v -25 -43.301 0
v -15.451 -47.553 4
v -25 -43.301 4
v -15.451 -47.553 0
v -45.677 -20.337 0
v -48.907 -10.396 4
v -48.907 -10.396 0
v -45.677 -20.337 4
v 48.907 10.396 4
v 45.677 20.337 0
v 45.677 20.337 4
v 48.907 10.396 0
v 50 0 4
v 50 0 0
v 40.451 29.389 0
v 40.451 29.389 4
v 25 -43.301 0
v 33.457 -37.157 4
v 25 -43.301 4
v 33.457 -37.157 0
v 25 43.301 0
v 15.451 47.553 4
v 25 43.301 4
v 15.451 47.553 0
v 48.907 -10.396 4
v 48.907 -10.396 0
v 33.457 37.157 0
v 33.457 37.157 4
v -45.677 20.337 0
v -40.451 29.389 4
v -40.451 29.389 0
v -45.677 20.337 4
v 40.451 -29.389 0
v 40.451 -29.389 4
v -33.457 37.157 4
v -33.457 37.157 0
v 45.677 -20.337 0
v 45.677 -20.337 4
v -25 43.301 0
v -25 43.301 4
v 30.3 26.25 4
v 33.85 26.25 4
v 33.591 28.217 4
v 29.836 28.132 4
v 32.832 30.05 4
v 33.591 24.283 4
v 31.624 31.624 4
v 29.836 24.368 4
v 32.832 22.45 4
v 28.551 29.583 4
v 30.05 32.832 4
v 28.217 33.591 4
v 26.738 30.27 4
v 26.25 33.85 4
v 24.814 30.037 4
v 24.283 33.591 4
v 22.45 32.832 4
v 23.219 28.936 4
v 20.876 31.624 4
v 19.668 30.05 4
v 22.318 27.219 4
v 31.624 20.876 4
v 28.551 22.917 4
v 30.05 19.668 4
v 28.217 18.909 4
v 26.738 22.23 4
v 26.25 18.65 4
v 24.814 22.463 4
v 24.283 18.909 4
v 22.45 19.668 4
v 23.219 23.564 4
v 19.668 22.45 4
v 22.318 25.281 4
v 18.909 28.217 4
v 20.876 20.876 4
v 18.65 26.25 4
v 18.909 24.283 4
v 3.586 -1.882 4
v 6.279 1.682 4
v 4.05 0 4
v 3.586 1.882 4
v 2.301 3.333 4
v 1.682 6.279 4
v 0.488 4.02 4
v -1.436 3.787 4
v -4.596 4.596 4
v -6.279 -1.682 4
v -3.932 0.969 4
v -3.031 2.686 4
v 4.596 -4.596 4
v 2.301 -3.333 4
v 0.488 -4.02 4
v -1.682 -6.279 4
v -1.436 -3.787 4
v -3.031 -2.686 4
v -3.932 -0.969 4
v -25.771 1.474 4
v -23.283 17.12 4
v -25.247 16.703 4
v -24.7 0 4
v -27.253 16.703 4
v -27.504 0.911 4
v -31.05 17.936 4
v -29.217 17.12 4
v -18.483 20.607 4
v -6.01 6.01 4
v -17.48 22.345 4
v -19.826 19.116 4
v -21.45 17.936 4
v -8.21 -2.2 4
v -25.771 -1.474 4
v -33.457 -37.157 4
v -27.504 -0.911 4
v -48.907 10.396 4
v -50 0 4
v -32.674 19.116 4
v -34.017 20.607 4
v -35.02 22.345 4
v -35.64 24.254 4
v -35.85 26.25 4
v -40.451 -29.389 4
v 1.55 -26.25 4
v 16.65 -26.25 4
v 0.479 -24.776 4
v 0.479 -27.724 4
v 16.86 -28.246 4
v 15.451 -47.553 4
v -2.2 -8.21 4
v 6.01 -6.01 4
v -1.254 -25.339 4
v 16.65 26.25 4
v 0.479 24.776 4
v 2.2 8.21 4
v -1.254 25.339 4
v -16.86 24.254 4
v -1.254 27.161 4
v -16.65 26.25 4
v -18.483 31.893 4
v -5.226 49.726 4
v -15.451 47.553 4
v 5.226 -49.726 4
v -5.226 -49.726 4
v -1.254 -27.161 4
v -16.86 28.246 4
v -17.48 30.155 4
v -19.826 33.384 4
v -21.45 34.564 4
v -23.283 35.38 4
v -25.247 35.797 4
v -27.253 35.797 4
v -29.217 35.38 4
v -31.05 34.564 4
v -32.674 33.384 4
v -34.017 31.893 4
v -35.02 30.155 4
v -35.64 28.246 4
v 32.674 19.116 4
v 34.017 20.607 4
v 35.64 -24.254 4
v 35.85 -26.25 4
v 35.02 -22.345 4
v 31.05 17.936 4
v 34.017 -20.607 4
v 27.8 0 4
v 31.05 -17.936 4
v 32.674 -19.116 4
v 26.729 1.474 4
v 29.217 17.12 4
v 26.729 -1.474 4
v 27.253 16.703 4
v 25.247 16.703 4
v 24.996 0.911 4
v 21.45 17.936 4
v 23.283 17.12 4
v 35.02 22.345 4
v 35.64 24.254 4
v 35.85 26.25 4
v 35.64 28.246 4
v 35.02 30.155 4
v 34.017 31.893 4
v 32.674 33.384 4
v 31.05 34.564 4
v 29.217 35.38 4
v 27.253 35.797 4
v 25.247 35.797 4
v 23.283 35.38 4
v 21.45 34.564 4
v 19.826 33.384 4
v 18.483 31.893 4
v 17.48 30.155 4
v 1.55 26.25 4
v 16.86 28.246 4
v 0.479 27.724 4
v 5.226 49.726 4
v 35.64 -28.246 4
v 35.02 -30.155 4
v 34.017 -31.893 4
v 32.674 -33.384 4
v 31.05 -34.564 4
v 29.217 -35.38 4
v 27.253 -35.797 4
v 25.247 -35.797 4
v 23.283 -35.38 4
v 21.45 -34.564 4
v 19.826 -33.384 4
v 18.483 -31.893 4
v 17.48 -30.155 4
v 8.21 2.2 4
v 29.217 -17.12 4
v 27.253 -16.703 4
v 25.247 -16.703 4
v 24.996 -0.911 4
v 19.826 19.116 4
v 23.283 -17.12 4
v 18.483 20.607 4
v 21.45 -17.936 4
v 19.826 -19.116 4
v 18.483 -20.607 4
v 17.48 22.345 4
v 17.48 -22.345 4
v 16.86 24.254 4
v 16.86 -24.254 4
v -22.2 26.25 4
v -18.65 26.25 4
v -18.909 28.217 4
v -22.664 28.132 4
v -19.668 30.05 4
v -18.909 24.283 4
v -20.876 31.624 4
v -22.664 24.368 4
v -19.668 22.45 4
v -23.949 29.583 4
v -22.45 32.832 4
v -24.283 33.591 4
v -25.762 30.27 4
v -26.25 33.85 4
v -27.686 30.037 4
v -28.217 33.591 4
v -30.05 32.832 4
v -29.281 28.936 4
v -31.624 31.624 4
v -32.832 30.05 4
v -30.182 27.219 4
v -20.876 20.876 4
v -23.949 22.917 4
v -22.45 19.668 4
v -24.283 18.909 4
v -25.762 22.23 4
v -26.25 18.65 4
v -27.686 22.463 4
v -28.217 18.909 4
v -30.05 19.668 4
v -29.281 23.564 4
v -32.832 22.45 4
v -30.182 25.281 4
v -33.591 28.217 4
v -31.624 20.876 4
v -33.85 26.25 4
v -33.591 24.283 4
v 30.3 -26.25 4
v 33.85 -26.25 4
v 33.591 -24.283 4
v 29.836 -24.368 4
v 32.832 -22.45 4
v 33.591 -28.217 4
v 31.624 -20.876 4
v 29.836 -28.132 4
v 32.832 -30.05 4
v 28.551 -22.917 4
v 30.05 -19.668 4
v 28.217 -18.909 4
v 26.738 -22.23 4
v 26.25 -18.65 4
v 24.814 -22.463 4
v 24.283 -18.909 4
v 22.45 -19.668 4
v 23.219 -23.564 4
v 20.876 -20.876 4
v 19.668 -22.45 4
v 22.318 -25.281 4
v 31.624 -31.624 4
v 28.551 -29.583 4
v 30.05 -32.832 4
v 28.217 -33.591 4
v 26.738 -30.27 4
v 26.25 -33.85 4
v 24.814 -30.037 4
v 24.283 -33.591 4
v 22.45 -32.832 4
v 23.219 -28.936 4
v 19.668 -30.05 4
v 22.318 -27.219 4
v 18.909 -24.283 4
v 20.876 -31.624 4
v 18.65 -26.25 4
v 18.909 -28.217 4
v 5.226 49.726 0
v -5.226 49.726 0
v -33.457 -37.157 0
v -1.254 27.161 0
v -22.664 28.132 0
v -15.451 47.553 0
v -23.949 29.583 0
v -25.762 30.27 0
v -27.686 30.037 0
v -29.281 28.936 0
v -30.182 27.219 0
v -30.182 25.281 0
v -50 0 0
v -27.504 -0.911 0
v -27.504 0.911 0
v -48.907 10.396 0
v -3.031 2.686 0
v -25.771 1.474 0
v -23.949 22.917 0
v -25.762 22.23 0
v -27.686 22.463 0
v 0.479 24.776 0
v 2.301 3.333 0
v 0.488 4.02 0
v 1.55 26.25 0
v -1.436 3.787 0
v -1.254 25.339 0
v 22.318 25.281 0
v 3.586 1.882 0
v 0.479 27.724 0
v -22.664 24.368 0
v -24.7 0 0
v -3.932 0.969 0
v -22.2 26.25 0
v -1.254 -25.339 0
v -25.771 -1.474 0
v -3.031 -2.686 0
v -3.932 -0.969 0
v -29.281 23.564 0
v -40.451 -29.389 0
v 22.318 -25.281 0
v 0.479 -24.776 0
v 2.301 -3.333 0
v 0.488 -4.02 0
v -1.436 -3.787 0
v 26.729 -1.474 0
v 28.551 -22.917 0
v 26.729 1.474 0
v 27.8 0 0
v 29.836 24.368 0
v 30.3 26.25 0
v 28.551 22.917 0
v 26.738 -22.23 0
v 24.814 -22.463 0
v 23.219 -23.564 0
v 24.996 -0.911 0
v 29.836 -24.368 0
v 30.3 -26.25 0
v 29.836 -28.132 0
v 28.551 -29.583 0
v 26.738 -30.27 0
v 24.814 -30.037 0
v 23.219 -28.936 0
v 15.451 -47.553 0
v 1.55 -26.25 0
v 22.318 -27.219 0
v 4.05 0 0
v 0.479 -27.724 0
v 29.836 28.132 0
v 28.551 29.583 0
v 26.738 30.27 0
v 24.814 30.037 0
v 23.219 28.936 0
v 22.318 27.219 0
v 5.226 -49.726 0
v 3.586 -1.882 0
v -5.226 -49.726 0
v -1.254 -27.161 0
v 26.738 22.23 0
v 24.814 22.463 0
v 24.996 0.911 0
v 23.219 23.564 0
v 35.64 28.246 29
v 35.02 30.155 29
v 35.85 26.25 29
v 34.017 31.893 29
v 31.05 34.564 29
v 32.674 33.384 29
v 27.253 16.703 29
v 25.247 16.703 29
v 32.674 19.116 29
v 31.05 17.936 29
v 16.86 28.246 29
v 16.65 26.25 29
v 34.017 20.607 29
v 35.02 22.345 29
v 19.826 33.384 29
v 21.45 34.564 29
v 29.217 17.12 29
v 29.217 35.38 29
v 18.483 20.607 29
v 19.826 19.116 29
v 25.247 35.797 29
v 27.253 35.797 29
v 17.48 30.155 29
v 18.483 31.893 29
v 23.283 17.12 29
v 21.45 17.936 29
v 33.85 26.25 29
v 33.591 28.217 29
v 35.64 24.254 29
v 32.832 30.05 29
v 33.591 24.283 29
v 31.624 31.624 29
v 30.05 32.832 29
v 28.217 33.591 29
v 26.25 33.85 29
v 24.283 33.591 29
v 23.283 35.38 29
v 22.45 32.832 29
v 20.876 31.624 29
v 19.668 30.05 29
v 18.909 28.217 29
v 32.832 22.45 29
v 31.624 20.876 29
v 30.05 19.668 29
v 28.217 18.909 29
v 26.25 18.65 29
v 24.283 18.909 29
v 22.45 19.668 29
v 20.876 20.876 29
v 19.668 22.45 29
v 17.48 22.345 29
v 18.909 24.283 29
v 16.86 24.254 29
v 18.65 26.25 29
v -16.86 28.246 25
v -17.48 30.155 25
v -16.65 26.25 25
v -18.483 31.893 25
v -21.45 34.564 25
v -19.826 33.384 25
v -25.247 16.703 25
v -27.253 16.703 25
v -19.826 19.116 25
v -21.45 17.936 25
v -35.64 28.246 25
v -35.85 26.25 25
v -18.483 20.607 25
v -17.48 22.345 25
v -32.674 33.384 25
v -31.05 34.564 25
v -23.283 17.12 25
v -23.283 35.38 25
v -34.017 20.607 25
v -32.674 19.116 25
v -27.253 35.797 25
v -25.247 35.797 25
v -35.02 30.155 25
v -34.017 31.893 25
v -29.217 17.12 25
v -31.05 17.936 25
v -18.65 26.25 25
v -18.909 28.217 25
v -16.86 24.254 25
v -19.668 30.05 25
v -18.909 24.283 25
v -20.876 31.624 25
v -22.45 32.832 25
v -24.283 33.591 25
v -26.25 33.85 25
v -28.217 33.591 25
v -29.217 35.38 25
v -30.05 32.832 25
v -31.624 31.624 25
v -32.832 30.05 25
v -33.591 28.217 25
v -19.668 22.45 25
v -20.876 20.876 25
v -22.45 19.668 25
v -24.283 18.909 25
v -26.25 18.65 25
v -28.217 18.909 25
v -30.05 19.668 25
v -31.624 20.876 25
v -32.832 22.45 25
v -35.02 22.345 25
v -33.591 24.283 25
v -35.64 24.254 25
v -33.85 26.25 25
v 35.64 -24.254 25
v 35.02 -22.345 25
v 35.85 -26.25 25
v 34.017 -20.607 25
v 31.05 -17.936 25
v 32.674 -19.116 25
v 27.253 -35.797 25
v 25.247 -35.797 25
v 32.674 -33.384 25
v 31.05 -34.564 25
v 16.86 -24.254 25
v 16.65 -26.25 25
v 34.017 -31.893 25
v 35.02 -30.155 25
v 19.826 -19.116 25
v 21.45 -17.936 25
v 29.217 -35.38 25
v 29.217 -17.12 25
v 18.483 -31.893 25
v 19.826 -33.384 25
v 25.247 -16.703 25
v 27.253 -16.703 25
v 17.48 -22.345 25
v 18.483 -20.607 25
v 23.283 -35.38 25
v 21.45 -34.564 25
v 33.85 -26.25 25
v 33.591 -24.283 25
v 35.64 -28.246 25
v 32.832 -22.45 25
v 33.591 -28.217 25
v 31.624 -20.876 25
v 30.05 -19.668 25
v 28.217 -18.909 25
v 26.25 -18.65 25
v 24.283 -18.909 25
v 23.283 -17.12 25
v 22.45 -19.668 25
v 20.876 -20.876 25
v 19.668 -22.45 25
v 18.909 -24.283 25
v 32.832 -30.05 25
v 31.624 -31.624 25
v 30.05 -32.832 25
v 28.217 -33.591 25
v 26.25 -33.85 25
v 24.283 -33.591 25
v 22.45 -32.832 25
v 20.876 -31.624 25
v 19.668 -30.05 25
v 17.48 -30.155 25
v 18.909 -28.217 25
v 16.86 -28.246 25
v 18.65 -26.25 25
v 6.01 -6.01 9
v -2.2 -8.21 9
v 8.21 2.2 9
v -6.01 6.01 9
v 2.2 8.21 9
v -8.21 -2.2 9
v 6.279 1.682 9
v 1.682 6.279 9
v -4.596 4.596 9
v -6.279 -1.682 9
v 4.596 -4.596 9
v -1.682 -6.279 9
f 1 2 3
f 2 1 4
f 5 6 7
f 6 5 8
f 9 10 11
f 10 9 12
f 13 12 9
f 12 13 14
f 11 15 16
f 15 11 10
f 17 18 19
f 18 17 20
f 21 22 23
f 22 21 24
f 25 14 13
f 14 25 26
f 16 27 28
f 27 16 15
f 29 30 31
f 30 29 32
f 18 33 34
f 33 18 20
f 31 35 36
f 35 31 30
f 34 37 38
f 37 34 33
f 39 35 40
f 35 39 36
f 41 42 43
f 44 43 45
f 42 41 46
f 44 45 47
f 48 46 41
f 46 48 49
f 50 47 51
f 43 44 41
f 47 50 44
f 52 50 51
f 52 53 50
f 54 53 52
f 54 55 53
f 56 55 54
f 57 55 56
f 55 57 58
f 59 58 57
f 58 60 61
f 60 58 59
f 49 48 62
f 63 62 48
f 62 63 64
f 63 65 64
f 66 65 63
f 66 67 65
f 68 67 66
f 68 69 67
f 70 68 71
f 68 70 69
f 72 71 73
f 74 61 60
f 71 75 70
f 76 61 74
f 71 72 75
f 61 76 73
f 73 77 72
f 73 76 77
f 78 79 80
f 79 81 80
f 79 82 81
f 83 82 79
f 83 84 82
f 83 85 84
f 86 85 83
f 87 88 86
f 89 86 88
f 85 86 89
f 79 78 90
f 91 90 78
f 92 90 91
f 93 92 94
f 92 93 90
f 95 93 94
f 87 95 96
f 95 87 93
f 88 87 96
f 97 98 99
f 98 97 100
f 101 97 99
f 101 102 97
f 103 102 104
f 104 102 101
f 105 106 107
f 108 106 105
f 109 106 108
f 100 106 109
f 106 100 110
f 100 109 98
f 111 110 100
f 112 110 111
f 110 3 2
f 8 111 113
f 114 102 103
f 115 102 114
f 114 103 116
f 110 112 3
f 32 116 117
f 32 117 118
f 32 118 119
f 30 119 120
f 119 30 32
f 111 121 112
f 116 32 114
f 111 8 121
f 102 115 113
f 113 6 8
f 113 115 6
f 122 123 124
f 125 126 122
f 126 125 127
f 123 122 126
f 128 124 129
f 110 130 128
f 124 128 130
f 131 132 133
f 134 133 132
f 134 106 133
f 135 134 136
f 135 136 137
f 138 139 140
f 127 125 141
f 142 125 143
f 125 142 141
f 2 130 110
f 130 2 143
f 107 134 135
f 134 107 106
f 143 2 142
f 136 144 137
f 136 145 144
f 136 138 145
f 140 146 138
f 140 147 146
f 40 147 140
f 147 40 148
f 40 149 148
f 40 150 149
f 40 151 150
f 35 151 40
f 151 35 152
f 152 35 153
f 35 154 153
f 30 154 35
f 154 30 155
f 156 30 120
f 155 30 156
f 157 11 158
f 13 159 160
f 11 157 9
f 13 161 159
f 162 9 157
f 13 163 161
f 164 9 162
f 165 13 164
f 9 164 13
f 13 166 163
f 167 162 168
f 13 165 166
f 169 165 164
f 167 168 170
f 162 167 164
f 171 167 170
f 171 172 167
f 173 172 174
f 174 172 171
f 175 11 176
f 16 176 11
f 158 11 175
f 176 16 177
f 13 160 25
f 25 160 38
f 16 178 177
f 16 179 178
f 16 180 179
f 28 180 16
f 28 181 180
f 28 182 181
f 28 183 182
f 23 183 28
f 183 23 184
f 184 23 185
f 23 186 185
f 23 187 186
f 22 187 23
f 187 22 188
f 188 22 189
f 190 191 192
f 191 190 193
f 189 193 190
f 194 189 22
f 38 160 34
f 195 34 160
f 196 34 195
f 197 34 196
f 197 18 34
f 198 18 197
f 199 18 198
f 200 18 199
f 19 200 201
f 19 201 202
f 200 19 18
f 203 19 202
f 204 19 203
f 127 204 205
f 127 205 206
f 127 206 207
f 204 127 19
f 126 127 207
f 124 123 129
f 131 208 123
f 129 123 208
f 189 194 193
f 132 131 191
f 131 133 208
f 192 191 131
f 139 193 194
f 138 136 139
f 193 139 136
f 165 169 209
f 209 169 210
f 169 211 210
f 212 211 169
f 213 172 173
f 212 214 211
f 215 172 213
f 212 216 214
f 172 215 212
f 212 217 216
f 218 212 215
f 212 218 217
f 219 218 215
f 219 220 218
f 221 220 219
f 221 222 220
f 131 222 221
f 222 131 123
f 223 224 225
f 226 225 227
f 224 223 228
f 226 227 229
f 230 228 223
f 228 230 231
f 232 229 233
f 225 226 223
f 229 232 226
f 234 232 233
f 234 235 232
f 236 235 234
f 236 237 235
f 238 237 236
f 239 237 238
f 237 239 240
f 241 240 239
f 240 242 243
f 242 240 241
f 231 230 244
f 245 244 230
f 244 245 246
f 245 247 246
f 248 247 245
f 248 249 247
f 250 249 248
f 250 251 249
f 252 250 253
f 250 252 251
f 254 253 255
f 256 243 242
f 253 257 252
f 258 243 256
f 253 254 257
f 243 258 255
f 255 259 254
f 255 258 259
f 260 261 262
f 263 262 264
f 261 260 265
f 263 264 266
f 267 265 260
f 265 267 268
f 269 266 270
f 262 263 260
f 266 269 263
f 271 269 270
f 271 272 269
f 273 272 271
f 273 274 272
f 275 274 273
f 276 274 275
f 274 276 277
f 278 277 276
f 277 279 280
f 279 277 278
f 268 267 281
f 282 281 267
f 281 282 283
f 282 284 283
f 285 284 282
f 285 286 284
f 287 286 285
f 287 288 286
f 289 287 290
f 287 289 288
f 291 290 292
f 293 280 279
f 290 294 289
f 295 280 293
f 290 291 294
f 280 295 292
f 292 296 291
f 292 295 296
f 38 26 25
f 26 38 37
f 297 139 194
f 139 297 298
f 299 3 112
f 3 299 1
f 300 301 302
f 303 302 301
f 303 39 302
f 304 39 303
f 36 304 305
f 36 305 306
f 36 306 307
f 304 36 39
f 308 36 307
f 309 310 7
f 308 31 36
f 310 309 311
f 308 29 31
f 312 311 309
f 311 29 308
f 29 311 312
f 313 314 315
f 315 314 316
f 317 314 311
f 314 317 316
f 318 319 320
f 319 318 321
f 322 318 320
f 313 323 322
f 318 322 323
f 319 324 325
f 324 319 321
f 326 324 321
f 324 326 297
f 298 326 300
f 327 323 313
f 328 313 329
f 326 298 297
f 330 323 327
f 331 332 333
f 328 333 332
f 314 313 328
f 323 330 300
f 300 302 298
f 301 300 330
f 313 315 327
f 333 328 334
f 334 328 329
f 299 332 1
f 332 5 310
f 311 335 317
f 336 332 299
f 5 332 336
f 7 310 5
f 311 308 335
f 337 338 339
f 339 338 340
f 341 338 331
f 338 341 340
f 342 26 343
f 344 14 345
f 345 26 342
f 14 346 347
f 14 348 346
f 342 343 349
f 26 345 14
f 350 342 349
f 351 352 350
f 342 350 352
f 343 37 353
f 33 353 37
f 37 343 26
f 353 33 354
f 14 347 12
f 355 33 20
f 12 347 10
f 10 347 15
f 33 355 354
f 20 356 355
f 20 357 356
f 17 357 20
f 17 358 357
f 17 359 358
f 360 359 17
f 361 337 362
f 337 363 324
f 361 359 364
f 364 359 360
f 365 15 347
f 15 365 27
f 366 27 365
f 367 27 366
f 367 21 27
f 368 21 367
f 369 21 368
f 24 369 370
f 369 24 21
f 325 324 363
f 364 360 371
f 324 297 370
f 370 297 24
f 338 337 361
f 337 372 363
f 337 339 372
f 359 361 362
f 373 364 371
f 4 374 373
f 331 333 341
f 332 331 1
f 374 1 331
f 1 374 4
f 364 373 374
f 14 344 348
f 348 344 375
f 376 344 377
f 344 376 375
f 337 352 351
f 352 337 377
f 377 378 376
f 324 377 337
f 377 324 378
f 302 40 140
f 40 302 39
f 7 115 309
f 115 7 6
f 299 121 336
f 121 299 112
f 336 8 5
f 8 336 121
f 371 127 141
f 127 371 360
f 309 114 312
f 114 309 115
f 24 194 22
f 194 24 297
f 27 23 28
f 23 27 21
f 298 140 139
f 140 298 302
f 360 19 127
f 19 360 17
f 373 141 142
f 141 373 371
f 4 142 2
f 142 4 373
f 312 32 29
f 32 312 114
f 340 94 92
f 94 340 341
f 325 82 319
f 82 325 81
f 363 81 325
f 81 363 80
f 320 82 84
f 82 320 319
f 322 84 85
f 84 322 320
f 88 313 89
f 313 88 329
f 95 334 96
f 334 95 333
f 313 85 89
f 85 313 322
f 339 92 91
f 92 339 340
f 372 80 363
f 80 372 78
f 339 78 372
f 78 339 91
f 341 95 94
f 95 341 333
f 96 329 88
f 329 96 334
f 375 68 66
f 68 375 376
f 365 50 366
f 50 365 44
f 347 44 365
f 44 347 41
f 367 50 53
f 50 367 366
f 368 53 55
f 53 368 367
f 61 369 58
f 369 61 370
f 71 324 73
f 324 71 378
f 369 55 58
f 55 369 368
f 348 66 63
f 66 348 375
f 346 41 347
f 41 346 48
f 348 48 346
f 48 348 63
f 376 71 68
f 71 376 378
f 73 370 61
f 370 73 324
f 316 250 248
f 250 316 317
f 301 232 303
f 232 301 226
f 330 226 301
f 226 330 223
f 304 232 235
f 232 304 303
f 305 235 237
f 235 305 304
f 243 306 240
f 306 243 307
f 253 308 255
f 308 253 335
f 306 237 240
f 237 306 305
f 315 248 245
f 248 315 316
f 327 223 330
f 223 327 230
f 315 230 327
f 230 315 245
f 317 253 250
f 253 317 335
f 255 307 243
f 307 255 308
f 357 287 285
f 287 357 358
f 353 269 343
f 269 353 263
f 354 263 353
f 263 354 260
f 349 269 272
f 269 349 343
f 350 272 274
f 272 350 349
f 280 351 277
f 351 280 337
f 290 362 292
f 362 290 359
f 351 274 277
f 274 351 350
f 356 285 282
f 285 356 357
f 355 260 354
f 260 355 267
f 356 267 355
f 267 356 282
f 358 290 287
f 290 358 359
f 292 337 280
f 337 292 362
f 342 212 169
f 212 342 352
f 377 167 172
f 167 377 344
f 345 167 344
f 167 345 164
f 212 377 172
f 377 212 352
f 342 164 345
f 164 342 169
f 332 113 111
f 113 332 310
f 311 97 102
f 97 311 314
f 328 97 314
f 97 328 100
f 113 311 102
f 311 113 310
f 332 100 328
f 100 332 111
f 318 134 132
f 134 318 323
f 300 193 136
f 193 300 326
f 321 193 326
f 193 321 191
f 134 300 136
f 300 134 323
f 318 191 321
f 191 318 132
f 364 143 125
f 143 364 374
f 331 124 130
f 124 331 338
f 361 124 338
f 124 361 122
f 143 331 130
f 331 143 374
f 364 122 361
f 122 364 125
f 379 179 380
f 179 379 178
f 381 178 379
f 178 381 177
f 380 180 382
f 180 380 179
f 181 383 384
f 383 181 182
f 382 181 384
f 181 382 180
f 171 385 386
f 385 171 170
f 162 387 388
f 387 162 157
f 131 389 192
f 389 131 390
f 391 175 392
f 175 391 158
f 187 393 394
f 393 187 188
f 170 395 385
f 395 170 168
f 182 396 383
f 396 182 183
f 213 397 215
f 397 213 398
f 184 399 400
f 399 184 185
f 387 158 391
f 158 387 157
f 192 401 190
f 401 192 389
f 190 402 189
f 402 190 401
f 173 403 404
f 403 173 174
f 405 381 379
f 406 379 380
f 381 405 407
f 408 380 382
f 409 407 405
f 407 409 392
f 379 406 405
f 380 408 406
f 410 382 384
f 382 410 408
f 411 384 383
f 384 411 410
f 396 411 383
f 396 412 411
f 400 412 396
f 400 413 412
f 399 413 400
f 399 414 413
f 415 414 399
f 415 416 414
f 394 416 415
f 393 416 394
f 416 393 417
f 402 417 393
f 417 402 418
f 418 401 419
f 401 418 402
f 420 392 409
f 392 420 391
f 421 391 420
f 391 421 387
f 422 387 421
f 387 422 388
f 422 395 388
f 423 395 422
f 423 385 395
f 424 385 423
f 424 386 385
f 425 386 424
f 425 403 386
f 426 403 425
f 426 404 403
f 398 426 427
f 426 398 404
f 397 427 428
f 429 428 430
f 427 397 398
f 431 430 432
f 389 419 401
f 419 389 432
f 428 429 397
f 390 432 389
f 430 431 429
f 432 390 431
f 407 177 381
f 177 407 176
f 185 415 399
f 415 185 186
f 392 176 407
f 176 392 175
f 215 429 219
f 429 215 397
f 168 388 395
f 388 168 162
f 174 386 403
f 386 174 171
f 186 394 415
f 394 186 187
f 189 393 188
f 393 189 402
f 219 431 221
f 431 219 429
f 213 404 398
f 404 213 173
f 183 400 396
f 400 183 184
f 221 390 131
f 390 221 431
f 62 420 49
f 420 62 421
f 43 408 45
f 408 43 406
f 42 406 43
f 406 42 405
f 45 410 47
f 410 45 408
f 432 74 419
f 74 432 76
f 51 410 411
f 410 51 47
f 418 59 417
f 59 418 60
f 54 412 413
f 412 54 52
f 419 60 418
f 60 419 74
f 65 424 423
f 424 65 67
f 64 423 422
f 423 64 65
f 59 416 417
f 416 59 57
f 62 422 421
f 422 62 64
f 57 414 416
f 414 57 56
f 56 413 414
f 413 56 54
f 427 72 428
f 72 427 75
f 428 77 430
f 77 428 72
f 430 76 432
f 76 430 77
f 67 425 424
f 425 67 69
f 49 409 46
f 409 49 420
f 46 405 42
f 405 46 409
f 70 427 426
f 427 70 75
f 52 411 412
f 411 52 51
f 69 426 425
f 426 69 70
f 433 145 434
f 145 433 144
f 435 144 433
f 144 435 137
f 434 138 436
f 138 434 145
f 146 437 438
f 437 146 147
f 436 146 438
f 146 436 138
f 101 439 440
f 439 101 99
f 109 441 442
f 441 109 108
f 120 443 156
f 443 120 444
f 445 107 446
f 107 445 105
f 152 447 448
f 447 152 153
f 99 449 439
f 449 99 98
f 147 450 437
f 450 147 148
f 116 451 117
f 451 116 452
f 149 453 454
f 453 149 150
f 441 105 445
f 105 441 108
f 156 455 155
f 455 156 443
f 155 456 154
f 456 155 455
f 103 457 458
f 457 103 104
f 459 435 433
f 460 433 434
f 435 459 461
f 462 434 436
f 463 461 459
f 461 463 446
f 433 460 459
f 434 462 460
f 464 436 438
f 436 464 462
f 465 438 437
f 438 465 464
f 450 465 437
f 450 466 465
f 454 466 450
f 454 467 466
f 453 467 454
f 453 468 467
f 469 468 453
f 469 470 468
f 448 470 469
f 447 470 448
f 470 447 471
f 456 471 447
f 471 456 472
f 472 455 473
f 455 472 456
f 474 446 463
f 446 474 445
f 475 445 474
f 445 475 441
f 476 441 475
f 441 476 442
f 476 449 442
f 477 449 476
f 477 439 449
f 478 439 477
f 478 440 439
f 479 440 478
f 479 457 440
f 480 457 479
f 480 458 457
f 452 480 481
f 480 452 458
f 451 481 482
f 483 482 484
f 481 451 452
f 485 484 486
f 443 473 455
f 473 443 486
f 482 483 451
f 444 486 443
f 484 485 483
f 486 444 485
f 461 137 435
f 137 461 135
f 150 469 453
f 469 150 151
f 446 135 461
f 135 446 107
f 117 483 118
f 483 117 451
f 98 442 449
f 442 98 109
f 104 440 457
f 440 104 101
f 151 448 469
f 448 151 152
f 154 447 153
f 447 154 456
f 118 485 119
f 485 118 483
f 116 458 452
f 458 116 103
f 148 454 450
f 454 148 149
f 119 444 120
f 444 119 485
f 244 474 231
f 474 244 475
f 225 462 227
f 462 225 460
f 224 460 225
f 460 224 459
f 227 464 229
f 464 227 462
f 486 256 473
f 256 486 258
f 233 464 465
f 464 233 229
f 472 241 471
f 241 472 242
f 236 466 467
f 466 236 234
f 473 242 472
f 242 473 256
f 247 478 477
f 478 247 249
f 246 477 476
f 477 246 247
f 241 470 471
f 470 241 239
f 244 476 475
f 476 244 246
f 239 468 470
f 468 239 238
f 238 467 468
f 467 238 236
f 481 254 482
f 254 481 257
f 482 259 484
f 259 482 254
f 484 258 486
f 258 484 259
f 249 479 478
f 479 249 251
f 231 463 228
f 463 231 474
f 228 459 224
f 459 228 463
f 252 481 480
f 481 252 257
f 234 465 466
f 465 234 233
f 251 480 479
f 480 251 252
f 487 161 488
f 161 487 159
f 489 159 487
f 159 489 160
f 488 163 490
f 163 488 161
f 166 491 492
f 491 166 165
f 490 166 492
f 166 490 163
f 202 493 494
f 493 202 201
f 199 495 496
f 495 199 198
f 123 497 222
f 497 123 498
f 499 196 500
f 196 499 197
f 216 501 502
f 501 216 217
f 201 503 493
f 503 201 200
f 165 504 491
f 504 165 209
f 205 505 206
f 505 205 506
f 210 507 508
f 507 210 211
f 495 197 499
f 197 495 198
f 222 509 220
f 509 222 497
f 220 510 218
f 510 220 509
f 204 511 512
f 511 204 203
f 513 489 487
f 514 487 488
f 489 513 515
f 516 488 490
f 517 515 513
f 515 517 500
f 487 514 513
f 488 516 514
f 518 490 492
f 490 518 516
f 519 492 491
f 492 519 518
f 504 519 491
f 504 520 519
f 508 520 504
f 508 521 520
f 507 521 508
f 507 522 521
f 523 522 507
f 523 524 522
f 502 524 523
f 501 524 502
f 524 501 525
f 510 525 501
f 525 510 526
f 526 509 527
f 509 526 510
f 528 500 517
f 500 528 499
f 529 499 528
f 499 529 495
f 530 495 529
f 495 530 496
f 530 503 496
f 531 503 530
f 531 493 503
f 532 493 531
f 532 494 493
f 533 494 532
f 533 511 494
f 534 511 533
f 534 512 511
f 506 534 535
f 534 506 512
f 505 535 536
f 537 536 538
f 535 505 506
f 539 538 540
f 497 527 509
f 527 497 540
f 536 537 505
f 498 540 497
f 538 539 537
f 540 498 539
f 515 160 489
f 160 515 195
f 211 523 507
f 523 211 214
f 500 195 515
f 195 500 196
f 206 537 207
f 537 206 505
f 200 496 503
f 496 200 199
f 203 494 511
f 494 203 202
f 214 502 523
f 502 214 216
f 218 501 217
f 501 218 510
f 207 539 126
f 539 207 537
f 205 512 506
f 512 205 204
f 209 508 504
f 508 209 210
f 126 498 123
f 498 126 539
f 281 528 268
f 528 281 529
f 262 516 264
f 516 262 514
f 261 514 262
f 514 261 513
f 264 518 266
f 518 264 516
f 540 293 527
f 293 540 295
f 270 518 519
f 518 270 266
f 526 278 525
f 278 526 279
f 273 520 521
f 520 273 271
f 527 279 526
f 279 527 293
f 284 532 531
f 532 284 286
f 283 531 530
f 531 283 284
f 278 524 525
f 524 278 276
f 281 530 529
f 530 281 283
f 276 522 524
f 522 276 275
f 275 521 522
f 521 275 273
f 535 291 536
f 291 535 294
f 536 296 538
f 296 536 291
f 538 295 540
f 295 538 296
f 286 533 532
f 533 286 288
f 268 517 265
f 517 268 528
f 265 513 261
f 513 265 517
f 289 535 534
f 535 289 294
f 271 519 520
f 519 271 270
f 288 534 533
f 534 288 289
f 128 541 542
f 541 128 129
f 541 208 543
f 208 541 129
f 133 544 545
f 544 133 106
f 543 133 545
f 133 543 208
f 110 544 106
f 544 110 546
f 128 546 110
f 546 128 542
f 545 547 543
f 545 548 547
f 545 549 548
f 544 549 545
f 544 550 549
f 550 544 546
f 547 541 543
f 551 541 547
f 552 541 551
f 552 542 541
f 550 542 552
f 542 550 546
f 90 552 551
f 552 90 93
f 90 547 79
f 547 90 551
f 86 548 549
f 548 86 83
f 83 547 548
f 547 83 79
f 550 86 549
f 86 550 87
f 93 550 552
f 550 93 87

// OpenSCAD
echo(version=version());

// units in mm
BASE_WIDTH = 113.0;
BASE_HEIGHT = 53.0;
BASE_WALL = 4.0;
INNER_RIDGE_HEIGHT = 6.0;
INNER_RIDGE_WIDTH = 2.0;

PLATFORM_WIDTH = 100.0;
PLATFORM_HEIGHT = 4.0;

SUPPORT_WIDTH = BASE_WIDTH - INNER_RIDGE_WIDTH * 4;
SUPPORT_HEIGHT = 20.0;

ROD_WIDTH = 8.1; // m8 
ROD_DEPTH = 10.0;
ROD_PLACEMENT = (BASE_WIDTH - INNER_RIDGE_WIDTH * 4) / 4;

BEARING_HEIGHT = 25.0;
BEARING_WIDTH = 15.2;
ROD_SHAFT_HEIGHT = BEARING_HEIGHT;
ROD_SHAFT_WIDTH = BEARING_WIDTH + 4;

STEPPER_ROD_NUT_WIDTH = 13.0;
STEPPER_ROD_HEIGHT = 5.0;
STEPPER_ROD_NUT_WALL = STEPPER_ROD_NUT_WIDTH + 4;

// stepper dims
STEPPER_WIDTH = 42.3;
STEPPER_HEIGHT = 33.0;
STEPPER_SCREW_SPACE = 31.0; 
STEPPER_HALF_SPACE = STEPPER_SCREW_SPACE / 2;
STEPPER_SCREW_SIZE = 3.1; // m3
STEPPER_SHAFT = 7.0;

// top shelf
difference() {
    cylinder(h=PLATFORM_HEIGHT, d=PLATFORM_WIDTH);
    
    // stepper shaft
    cylinder(h=PLATFORM_HEIGHT, d=ROD_WIDTH);
    
    // support rods
    translate([ROD_PLACEMENT, ROD_PLACEMENT, 0])
        cylinder(h=ROD_DEPTH, d=ROD_WIDTH);
    translate([-1 * ROD_PLACEMENT, ROD_PLACEMENT, 0])
        cylinder(h=ROD_DEPTH, d=ROD_WIDTH);
    translate([ROD_PLACEMENT, -1 * ROD_PLACEMENT, 0])
        cylinder(h=ROD_DEPTH, d=ROD_WIDTH);
    
     // bottom/top connections
     translate([ROD_PLACEMENT, 0, 0])
        cylinder(h=PLATFORM_HEIGHT, d=STEPPER_SCREW_SIZE);
     translate([-1 * ROD_PLACEMENT, 0, 0])
        cylinder(h=PLATFORM_HEIGHT, d=STEPPER_SCREW_SIZE);
     translate([0, ROD_PLACEMENT, 0])
        cylinder(h=PLATFORM_HEIGHT, d=STEPPER_SCREW_SIZE);
    translate([0, -1 * ROD_PLACEMENT, 0])
        cylinder(h=PLATFORM_HEIGHT, d=STEPPER_SCREW_SIZE);
}

// rod support + bearing housing
translate([0, 0, PLATFORM_HEIGHT])
    translate([ROD_PLACEMENT, ROD_PLACEMENT, 0])
        difference() {
            cylinder(h=ROD_SHAFT_HEIGHT, d=ROD_SHAFT_WIDTH);
            cylinder(h=ROD_SHAFT_HEIGHT, d=BEARING_WIDTH);
        }
        
    translate([-1 * ROD_PLACEMENT, ROD_PLACEMENT, 0])
        difference() {
            cylinder(h=ROD_SHAFT_HEIGHT, d=ROD_SHAFT_WIDTH);
            cylinder(h=ROD_SHAFT_HEIGHT, d=BEARING_WIDTH);
        }
        
    translate([ROD_PLACEMENT, -1 * ROD_PLACEMENT, 0])
        difference() {
            cylinder(h=ROD_SHAFT_HEIGHT, d=ROD_SHAFT_WIDTH);
            cylinder(h=ROD_SHAFT_HEIGHT, d=BEARING_WIDTH);
        }
        
 // m8 stepper rod
 translate([0, 0, PLATFORM_HEIGHT])
 rotate([0, 0, 15])
     difference() {
        cylinder($fn=6, h=STEPPER_ROD_HEIGHT, d=STEPPER_ROD_NUT_WALL);
        cylinder($fn=6, h=STEPPER_ROD_HEIGHT, d=STEPPER_ROD_NUT_WIDTH);
     }
  
